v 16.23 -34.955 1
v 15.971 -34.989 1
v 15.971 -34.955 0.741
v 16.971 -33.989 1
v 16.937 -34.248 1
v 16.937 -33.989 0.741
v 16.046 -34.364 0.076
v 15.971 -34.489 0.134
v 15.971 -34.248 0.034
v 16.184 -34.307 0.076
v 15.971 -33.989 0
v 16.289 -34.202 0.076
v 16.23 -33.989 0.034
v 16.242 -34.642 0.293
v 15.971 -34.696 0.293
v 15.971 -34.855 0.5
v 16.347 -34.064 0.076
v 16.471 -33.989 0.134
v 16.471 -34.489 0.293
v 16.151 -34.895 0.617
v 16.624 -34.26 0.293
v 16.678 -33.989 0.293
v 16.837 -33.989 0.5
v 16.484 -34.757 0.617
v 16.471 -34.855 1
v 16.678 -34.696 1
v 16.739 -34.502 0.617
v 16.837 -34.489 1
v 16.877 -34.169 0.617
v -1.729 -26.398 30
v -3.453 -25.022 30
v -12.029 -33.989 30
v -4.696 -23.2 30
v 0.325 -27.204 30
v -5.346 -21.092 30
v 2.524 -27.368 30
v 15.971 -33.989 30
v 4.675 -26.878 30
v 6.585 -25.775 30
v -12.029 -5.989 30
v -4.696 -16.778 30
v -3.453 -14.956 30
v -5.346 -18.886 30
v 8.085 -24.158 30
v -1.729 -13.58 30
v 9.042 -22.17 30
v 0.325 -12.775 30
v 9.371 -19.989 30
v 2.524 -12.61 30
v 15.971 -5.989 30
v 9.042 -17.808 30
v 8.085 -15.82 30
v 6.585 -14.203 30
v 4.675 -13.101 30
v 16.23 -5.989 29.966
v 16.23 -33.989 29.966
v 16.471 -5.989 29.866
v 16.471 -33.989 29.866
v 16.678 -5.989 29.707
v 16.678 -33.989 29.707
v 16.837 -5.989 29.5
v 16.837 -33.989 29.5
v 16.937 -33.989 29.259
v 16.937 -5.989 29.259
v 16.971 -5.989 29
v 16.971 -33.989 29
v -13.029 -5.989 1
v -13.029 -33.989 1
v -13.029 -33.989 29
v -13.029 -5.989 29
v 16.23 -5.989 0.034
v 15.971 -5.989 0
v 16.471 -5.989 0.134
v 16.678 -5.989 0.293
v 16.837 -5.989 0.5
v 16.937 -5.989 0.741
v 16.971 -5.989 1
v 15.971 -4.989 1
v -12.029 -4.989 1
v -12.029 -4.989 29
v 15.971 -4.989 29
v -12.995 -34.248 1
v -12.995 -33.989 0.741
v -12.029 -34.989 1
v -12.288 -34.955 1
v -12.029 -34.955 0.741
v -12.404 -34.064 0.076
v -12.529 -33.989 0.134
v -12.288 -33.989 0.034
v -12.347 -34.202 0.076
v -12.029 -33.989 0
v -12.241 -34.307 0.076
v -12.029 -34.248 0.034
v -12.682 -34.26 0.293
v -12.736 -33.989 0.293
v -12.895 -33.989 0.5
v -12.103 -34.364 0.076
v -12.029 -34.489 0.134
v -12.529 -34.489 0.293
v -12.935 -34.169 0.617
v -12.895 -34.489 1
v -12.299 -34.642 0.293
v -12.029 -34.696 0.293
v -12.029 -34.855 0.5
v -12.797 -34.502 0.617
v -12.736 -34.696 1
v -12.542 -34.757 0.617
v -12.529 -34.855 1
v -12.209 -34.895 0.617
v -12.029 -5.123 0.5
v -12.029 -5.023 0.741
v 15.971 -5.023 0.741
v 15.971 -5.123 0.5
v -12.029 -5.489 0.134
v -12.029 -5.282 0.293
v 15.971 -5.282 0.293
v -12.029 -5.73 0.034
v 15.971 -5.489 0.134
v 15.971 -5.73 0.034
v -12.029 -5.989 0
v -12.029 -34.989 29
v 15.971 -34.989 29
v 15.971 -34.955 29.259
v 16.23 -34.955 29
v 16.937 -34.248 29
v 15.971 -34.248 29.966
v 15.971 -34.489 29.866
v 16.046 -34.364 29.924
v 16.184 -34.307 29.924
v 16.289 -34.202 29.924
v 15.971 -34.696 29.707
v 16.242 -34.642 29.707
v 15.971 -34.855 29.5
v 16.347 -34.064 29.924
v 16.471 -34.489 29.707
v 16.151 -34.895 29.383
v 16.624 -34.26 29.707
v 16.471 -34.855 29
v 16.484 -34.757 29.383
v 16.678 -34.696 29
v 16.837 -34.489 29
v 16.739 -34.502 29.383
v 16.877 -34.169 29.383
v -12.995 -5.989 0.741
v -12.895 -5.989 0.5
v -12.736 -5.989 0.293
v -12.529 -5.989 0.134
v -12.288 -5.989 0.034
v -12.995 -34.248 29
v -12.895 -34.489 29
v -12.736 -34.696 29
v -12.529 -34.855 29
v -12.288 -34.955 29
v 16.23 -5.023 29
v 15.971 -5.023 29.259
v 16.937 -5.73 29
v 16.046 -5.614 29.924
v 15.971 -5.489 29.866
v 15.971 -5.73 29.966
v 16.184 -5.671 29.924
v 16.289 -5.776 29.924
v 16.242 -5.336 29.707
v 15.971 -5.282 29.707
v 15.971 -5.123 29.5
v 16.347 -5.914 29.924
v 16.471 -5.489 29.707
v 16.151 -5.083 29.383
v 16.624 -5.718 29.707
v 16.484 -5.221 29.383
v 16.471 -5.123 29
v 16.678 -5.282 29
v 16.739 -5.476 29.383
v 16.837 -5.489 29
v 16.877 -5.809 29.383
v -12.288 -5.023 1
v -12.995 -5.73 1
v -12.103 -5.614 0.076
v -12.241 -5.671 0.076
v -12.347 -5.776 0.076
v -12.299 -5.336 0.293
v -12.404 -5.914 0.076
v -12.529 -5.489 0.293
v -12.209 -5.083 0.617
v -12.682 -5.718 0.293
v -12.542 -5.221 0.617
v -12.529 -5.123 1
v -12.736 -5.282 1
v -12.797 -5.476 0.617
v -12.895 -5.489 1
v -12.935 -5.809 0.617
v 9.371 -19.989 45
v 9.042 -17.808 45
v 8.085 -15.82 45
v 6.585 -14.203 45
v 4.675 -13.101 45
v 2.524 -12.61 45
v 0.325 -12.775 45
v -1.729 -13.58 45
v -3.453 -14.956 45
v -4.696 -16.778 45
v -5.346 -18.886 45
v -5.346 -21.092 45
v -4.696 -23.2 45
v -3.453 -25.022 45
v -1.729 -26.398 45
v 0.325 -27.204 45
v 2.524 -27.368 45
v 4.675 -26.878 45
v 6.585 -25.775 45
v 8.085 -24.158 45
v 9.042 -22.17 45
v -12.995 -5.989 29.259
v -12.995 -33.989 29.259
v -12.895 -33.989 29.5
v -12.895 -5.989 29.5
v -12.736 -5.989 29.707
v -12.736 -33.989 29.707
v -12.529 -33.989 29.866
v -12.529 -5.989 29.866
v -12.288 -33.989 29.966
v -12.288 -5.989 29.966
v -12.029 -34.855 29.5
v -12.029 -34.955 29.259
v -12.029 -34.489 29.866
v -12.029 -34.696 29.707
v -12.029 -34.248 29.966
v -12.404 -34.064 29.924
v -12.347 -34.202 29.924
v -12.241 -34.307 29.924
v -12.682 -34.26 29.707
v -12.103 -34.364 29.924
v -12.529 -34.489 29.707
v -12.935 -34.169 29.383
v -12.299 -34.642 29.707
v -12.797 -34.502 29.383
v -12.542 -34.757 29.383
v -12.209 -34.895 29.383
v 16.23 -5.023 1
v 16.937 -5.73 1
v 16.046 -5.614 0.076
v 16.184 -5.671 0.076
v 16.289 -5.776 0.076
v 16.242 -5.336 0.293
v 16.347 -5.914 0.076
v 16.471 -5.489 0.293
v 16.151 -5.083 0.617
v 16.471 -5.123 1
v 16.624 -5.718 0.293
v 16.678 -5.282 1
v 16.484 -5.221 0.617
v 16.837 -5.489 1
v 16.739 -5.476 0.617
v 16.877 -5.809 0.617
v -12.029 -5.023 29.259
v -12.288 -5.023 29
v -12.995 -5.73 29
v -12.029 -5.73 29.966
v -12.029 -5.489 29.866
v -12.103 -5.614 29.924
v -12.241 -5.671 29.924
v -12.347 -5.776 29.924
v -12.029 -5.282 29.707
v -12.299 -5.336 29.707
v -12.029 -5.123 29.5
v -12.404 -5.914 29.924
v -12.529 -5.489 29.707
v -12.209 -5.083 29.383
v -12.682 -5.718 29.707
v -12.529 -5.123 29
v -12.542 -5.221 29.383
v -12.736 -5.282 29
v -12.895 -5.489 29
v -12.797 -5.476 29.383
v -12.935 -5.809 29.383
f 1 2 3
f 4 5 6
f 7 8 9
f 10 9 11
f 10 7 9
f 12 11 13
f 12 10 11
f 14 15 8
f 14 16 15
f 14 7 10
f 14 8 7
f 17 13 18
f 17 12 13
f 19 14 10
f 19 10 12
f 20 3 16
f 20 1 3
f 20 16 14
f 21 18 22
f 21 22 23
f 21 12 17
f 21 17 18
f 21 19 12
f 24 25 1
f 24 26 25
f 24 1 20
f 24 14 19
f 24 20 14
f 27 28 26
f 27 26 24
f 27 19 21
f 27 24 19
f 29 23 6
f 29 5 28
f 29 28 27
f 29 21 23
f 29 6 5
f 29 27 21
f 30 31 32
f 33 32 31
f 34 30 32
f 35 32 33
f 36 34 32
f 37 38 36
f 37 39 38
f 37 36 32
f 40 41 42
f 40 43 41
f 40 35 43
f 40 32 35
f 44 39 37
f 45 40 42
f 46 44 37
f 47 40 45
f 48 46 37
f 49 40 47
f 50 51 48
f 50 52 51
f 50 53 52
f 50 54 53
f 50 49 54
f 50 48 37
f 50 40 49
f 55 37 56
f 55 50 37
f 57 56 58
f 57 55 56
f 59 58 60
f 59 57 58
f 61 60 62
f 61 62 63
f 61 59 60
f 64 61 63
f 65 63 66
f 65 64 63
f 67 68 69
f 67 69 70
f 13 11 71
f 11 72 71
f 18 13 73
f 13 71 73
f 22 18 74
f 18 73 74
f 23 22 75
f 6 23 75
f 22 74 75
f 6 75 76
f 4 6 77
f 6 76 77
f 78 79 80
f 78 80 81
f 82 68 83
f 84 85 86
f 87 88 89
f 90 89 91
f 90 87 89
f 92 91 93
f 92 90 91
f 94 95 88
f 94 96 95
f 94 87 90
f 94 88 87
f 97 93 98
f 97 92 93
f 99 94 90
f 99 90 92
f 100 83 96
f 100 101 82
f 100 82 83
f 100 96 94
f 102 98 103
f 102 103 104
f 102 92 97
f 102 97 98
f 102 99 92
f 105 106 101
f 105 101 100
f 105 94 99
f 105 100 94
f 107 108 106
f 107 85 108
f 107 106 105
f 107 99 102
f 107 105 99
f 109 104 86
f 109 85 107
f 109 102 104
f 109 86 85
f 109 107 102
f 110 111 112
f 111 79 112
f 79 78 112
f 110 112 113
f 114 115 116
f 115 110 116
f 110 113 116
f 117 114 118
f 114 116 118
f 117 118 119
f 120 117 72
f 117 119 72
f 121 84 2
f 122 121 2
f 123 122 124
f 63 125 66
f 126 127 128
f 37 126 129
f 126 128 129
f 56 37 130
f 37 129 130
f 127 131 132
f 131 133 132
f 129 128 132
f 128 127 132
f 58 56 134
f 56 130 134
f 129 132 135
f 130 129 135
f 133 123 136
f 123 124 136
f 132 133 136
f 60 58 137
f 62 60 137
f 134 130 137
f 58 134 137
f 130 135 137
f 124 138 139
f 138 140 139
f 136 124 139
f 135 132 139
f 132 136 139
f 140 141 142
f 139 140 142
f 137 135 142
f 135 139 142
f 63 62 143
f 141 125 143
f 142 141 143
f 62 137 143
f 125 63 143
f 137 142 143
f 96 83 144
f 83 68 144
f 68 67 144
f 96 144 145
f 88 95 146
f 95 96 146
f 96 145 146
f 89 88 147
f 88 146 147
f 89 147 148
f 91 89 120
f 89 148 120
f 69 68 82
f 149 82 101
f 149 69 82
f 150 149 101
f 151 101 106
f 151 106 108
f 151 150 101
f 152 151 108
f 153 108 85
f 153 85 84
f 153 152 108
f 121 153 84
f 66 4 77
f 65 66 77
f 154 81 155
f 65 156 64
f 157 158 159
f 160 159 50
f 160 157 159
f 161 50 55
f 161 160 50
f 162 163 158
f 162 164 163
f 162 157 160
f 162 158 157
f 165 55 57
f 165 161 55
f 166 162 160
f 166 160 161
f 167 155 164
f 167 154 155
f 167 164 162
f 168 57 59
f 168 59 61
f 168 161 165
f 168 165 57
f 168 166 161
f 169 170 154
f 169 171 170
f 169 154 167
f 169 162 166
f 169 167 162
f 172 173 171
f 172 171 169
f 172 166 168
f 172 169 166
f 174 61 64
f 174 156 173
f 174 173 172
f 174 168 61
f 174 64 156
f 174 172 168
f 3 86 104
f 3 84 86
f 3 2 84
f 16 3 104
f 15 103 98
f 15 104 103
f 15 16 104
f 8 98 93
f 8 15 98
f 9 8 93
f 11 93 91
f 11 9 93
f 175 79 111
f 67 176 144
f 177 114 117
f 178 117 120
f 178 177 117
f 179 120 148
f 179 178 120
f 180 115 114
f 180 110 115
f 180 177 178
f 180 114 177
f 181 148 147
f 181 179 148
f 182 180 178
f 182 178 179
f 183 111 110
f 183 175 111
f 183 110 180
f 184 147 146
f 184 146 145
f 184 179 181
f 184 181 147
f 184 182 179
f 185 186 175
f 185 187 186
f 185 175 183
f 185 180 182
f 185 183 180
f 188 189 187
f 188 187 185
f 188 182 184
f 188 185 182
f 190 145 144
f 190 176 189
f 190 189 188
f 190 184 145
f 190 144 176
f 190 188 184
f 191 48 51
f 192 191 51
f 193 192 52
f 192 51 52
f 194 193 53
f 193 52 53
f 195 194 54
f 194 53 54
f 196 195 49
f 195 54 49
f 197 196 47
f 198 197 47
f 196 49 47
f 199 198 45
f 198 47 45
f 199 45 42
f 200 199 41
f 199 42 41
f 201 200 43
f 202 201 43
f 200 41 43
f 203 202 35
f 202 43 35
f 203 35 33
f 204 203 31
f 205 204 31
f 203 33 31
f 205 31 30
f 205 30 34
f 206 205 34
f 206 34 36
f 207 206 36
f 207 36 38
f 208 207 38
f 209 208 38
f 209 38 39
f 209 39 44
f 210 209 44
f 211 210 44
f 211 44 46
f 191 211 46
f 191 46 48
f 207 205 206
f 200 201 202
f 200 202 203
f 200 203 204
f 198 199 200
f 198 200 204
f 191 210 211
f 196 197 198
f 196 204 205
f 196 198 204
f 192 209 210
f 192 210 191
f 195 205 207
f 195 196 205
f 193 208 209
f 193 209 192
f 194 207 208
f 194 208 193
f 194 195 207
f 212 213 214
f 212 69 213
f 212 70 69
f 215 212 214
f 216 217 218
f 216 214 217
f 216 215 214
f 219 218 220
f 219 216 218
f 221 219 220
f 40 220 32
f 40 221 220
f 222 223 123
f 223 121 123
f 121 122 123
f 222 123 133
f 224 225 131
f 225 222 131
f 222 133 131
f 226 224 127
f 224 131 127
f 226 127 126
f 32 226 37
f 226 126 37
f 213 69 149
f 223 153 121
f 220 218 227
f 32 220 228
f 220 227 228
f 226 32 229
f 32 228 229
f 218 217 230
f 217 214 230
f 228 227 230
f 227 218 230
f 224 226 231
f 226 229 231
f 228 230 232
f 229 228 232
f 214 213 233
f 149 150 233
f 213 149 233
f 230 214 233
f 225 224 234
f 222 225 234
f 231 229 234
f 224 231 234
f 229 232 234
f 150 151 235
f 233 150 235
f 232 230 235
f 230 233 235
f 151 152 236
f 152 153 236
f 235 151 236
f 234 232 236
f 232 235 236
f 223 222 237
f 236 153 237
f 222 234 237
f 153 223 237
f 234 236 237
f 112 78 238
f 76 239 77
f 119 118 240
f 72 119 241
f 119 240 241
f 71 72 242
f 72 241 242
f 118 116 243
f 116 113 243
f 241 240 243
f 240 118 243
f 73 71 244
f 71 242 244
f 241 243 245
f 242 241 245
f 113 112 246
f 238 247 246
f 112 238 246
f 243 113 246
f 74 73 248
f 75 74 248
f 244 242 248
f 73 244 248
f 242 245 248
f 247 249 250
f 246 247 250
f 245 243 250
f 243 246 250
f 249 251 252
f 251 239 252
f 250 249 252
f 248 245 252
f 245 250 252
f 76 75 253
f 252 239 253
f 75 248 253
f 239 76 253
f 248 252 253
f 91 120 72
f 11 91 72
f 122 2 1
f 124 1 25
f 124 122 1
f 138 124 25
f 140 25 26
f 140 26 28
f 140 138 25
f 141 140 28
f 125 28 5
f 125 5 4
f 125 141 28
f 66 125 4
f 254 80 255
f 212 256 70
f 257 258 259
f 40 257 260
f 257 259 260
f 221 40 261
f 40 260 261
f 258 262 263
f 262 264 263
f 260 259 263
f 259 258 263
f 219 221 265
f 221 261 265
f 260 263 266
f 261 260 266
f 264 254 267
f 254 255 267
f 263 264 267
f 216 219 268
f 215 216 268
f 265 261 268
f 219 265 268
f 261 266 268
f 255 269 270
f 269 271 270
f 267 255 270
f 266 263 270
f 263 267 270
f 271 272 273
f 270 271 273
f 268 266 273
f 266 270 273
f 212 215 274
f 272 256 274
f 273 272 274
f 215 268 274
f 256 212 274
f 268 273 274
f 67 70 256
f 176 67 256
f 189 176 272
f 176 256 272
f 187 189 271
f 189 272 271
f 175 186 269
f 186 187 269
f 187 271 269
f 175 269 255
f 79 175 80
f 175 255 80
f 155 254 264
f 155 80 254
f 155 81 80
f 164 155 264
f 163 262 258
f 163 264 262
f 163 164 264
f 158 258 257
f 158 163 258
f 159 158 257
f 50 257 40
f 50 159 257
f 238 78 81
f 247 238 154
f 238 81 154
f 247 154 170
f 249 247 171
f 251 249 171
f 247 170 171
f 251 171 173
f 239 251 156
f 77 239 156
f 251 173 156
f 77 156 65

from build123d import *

# Parameters (mm, degrees)
F0_R     = 7.4
F1_DEPTH = 45
F0_W     = 30
F0_H     = 30
F2_DEPTH = 30
F3_R     = 1


with BuildPart() as f1:
    # F0 (on Top) → F1 (new body)
    with BuildSketch(Plane.XY):
        with Locations((1.971214, -19.989052)):
            Circle(F0_R)
    extrude(amount=F1_DEPTH)

    # F0 (on Top) → F2 (join)
    with BuildSketch(Plane.XY):
        with Locations((1.971214, -19.989052)):
            Rectangle(F0_W, F0_H)
        with Locations((1.971214, -19.989052)):
            Circle(F0_R, mode=Mode.SUBTRACT)
    extrude(amount=F2_DEPTH)

    # F3
    f3_edges = [f1.edges().sort_by_distance(p)[0] for p in [
        (16.971214, -4.989052, 15),
        (-13.028786, -4.989052, 15),
        (1.971214, -4.989052, 0),
        (1.971214, -4.989052, 30),
        (-13.028786, -34.989052, 15),
        (-13.028786, -19.989052, 0),
        (-13.028786, -19.989052, 30),
        (16.971214, -34.989052, 15),
        (1.971214, -34.989052, 0),
        (1.971214, -34.989052, 30),
        (16.971214, -19.989052, 0),
        (16.971214, -19.989052, 30),
    ]]
    fillet(f3_edges, radius=F3_R)


solid = f1.part
